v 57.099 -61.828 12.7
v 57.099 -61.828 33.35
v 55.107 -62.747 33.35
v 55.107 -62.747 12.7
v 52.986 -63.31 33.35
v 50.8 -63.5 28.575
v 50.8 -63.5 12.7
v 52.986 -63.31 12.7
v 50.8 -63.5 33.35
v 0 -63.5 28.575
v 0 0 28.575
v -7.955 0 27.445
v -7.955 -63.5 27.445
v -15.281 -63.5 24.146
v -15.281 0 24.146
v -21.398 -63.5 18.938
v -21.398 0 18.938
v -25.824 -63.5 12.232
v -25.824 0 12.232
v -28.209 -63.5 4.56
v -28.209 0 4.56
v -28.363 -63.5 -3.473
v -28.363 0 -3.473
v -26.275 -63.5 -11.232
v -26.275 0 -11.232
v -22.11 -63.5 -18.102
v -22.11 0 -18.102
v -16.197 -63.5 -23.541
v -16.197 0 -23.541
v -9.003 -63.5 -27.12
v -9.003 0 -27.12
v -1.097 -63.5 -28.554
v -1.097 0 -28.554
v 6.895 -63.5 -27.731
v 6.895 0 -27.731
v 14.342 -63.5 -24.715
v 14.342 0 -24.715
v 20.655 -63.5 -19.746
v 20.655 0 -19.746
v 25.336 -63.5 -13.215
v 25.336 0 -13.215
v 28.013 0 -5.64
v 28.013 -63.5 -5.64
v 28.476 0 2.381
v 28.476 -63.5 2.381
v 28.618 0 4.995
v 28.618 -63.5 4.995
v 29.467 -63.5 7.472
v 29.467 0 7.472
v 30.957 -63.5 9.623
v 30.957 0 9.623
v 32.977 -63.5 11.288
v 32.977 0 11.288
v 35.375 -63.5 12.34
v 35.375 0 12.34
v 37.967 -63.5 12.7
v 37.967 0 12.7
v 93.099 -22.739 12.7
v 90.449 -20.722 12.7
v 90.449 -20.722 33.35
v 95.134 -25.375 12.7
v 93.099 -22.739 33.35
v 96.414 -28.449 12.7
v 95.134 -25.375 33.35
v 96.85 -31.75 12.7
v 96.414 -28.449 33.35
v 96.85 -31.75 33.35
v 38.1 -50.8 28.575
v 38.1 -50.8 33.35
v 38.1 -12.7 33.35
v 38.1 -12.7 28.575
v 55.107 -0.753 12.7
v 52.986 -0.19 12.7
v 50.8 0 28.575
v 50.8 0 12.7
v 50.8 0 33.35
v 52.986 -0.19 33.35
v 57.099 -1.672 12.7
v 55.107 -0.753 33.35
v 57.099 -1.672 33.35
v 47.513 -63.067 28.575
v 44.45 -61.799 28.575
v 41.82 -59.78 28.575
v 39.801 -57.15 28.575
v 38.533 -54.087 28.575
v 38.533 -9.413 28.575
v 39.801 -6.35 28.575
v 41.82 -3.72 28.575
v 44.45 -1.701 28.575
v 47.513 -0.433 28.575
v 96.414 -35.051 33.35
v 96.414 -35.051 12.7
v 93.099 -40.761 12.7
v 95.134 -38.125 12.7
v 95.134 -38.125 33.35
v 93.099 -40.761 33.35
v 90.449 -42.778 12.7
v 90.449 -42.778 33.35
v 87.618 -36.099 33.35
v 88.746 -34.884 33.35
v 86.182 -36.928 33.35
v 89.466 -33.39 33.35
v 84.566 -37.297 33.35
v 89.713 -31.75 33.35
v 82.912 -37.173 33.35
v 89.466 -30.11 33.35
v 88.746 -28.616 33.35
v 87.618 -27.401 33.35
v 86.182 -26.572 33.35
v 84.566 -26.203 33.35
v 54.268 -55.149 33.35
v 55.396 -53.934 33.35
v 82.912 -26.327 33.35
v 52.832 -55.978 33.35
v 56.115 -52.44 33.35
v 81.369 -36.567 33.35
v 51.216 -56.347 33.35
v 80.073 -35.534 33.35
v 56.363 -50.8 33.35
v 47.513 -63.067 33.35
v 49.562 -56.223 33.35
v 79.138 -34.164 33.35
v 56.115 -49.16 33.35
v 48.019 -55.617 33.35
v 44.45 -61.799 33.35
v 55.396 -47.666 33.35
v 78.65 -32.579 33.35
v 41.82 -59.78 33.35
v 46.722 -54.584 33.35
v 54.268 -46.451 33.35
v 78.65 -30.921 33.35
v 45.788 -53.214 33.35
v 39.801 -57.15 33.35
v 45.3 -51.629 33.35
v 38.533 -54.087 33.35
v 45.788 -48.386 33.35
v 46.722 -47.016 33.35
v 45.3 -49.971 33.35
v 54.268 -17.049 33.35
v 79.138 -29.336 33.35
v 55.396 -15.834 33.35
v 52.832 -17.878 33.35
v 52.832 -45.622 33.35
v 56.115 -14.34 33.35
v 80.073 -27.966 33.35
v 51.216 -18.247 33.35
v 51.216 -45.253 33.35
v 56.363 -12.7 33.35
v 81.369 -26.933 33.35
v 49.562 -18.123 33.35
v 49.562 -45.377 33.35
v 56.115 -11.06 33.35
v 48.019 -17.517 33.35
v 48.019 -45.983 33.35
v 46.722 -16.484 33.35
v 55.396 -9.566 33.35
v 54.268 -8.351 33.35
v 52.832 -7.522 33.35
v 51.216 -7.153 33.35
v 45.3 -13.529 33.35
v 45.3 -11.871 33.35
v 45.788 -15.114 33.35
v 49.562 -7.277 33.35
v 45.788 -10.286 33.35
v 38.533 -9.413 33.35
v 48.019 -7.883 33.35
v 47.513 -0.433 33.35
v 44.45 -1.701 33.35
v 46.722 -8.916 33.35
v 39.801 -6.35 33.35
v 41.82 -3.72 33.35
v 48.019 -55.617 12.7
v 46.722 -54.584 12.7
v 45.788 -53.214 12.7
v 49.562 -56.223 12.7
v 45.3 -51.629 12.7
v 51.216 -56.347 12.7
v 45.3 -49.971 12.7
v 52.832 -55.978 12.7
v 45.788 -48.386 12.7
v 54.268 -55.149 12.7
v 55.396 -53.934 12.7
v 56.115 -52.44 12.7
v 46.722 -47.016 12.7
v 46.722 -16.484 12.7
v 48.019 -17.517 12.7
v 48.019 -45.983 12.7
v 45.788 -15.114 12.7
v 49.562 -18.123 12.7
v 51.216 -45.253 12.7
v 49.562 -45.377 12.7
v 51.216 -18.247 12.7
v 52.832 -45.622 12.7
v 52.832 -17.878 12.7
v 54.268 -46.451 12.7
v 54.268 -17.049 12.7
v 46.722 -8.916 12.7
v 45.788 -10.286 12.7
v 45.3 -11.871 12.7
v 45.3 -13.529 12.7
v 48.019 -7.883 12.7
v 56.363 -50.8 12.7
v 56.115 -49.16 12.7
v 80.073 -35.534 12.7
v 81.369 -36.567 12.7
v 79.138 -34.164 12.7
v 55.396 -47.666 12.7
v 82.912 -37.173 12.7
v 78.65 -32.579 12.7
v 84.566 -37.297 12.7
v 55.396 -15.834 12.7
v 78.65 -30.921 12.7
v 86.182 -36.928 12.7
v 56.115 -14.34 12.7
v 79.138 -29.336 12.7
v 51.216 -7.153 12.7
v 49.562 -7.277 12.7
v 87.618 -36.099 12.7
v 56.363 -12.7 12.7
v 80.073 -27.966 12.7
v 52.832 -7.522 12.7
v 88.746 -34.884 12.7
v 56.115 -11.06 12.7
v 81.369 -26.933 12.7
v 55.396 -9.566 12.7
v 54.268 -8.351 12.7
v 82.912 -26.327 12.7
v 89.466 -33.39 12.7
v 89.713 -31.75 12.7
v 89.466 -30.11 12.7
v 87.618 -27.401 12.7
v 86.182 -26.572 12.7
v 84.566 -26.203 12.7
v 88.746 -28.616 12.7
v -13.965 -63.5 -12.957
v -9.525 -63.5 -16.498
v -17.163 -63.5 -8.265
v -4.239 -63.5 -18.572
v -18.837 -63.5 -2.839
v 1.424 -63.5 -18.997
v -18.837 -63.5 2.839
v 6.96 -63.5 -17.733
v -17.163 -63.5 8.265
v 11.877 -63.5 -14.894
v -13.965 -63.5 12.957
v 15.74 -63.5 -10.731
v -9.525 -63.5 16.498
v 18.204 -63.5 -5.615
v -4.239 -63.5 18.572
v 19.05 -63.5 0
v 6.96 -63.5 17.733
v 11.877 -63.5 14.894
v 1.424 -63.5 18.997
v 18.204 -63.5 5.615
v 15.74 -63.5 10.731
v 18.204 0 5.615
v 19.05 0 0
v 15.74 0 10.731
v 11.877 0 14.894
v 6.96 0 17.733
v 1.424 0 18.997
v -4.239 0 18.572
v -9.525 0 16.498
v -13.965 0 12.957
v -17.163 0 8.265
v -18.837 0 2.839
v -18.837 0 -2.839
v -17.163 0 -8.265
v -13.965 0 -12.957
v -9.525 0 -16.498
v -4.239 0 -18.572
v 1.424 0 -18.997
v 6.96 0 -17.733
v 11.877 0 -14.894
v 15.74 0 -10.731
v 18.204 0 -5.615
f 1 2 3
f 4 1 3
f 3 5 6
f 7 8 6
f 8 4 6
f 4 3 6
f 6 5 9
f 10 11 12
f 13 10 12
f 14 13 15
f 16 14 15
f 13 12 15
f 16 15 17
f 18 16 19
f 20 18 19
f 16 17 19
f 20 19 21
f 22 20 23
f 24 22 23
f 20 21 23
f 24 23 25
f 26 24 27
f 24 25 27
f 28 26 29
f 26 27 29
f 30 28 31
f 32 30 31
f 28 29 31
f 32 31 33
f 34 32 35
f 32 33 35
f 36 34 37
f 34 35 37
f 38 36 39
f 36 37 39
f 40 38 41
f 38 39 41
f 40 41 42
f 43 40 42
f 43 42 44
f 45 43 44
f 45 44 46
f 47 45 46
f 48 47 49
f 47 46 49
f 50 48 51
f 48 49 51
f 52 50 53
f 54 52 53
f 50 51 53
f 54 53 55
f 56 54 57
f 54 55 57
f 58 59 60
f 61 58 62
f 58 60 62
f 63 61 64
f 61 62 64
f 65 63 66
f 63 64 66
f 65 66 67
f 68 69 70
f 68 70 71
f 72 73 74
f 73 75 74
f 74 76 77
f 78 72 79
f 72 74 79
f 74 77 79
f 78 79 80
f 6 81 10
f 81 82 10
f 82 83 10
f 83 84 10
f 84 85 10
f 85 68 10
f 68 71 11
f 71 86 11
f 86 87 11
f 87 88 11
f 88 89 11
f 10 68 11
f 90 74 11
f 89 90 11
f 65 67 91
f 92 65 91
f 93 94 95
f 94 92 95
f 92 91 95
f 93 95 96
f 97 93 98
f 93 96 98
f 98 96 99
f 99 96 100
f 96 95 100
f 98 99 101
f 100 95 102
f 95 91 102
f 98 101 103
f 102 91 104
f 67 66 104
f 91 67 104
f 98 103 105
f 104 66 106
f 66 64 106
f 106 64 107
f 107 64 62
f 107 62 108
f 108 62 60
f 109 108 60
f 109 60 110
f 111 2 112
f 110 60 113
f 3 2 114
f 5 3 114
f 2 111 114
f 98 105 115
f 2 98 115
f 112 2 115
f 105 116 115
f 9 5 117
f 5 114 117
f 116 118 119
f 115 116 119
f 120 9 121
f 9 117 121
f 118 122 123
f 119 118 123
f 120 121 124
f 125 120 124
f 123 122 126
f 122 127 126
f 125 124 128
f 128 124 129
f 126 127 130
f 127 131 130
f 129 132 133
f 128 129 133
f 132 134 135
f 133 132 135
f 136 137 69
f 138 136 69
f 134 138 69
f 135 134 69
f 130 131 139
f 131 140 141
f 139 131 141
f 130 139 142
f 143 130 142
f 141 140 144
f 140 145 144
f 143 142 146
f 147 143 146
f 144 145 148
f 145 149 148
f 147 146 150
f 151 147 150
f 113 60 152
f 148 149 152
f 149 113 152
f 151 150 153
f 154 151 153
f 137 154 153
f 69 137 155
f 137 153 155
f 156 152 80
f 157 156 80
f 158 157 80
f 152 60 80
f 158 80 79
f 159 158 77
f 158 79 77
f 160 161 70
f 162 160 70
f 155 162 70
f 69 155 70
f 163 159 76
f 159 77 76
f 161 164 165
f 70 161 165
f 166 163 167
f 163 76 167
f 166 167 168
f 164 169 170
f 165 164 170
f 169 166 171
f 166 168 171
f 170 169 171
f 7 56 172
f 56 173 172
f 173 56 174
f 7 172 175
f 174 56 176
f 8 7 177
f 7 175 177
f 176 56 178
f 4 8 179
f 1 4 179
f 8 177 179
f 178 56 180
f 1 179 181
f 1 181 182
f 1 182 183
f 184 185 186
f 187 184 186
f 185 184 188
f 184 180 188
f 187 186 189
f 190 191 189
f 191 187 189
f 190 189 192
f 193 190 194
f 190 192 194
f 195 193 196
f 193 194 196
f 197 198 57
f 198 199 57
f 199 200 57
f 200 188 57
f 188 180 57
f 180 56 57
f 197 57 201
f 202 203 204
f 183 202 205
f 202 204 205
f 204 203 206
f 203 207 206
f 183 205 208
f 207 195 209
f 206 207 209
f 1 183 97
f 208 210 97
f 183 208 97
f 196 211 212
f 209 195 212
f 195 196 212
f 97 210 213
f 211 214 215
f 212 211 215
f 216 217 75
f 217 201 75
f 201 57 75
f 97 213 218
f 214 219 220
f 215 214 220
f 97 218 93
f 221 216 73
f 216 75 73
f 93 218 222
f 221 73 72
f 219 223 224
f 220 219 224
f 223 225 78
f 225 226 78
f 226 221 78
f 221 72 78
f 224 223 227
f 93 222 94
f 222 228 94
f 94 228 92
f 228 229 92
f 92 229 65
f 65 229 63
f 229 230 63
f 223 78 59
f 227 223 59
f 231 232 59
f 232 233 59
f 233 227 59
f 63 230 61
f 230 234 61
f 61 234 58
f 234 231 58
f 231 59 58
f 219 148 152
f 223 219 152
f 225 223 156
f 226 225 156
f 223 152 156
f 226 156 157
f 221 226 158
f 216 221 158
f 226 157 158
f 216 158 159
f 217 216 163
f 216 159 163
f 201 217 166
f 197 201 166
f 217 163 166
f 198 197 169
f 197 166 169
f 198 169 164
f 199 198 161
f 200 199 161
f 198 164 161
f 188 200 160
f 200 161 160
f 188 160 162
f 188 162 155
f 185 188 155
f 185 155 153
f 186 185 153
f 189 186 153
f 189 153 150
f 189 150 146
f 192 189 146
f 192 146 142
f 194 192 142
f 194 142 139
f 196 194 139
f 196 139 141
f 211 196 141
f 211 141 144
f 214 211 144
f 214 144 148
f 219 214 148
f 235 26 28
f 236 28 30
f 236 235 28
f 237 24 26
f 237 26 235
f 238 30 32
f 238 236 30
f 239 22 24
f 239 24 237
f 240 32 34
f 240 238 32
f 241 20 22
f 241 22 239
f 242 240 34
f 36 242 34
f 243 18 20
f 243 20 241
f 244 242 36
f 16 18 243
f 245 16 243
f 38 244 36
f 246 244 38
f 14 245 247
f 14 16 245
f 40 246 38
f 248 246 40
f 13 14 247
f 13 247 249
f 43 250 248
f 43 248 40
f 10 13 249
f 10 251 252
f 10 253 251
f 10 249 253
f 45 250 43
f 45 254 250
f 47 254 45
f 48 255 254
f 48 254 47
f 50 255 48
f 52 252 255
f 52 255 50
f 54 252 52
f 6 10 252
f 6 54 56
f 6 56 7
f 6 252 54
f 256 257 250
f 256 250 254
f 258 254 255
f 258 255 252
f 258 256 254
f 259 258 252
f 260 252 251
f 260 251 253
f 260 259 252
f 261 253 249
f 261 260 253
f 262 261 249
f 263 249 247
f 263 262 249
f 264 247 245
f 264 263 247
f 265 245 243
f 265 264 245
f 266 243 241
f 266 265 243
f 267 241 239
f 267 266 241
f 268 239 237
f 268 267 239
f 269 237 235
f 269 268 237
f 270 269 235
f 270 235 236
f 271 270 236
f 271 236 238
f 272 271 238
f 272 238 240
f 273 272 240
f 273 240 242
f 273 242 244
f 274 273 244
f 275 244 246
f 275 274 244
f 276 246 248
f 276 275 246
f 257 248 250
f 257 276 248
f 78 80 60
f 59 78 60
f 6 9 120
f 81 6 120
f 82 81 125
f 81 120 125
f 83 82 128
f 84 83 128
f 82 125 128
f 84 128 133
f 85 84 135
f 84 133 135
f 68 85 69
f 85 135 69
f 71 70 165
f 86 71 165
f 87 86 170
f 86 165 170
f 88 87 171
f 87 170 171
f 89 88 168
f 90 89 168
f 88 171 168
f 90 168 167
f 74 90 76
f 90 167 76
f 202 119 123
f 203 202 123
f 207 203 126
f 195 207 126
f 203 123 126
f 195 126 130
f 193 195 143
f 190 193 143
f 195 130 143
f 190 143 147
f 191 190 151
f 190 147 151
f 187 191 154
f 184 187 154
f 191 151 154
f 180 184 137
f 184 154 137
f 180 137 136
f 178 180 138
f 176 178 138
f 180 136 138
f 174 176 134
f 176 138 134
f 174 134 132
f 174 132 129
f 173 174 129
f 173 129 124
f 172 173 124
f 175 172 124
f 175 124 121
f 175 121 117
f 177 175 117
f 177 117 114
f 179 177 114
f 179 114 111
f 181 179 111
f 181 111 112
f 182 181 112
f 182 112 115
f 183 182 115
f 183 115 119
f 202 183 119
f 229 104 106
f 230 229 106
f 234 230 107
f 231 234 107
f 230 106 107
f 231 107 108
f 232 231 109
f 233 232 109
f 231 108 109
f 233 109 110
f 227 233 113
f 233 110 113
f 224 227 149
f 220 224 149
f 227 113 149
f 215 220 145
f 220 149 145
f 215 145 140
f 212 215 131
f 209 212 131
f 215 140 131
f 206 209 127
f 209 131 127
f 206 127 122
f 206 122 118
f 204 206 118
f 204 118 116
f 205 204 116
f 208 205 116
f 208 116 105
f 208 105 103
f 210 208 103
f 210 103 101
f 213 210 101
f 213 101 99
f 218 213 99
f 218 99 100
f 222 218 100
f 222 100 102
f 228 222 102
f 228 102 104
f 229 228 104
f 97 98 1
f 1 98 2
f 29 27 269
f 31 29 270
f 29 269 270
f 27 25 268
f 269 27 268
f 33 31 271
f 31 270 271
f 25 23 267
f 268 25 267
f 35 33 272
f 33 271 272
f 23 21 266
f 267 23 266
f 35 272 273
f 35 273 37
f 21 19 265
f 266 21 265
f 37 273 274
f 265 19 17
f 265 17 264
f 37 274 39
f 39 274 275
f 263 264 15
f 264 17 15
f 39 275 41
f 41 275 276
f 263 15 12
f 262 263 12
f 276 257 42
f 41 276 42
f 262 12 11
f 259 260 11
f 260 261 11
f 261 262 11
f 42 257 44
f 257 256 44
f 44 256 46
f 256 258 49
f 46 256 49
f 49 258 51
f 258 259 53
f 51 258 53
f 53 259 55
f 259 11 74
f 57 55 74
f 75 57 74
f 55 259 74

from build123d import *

# Parameters (mm, degrees)
F0_R     = 19.05
F1_DEPTH = 63.5
F2_R     = 5.5626
F3_DEPTH = 61.9262
F4_DEPTH = 4.7752
F5_DEPTH = 61.9262


with BuildPart() as f1:
    # F0 (on Front) → F1 (new body)
    with BuildSketch(Plane.XZ):
        with BuildLine():
            Line((38.1, 28.575), (0, 28.575))
            ThreePointArc((0, 28.575), (-19.345366451, -21.0306305629), (28.4756083945, 2.38125))
            ThreePointArc((28.4756083945, 2.38125), (30.9572676717, 9.6234554837), (37.9674778593, 12.7))
            Line((37.9674778593, 12.7), (96.8502, 12.7))
            Line((96.8502, 12.7), (96.8502, 33.3502))
            Line((96.8502, 33.3502), (38.1, 33.3502))
            Line((38.1, 33.3502), (38.1, 28.575))
        make_face()
        Circle(F0_R, mode=Mode.SUBTRACT)
    extrude(amount=F1_DEPTH)

    # F2 (on face) → F3 (cut, through all)
    with BuildSketch(Plane.XY.offset(33.3502)):
        with Locations((50.8, -50.8)):
            Circle(F2_R)
        with Locations((50.8, -12.7)):
            Circle(F2_R)
        with Locations((84.1502, -31.75)):
            Circle(F2_R)
    extrude(amount=-F3_DEPTH, mode=Mode.SUBTRACT)

    # F2 (on face) → F4 (cut)
    with BuildSketch(Plane.XY.offset(33.3502)):
        with BuildLine():
            ThreePointArc((38.1, -12.7), (41.8197438789, -3.7197438789), (50.8, 0))
            Line((50.8, 0), (38.1, 0))
            Line((38.1, 0), (38.1, -12.7))
        make_face()
        with BuildLine():
            Line((38.1, -63.5), (50.8, -63.5))
            ThreePointArc((50.8, -63.5), (41.8197438789, -59.7802561211), (38.1, -50.8))
            Line((38.1, -50.8), (38.1, -63.5))
        make_face()
    extrude(amount=-F4_DEPTH, mode=Mode.SUBTRACT)

    # F2 (on face) → F5 (cut, through all)
    with BuildSketch(Plane.XY.offset(33.3502)):
        with BuildLine():
            ThreePointArc((96.8502, -31.75), (95.1340352623, -38.1253715915), (90.4493554441, -42.7777214642))
            Line((90.4493554441, -42.7777214642), (57.0991554441, -61.8277214642))
            ThreePointArc((57.0991554441, -61.8277214642), (54.0586759125, -63.0748128824), (50.8, -63.5))
            Line((50.8, -63.5), (96.8502, -63.5))
            Line((96.8502, -63.5), (96.8502, -31.75))
        make_face()
        with BuildLine():
            ThreePointArc((90.4493554441, -20.7222785358), (95.1340352623, -25.3746284085), (96.8502, -31.75))
            Line((96.8502, -31.75), (96.8502, 0))
            Line((96.8502, 0), (50.8, 0))
            ThreePointArc((50.8, 0), (54.0586759125, -0.4251871176), (57.0991554441, -1.6722785358))
            Line((57.0991554441, -1.6722785358), (90.4493554441, -20.7222785358))
        make_face()
    extrude(amount=-F5_DEPTH, mode=Mode.SUBTRACT)


solid = f1.part
